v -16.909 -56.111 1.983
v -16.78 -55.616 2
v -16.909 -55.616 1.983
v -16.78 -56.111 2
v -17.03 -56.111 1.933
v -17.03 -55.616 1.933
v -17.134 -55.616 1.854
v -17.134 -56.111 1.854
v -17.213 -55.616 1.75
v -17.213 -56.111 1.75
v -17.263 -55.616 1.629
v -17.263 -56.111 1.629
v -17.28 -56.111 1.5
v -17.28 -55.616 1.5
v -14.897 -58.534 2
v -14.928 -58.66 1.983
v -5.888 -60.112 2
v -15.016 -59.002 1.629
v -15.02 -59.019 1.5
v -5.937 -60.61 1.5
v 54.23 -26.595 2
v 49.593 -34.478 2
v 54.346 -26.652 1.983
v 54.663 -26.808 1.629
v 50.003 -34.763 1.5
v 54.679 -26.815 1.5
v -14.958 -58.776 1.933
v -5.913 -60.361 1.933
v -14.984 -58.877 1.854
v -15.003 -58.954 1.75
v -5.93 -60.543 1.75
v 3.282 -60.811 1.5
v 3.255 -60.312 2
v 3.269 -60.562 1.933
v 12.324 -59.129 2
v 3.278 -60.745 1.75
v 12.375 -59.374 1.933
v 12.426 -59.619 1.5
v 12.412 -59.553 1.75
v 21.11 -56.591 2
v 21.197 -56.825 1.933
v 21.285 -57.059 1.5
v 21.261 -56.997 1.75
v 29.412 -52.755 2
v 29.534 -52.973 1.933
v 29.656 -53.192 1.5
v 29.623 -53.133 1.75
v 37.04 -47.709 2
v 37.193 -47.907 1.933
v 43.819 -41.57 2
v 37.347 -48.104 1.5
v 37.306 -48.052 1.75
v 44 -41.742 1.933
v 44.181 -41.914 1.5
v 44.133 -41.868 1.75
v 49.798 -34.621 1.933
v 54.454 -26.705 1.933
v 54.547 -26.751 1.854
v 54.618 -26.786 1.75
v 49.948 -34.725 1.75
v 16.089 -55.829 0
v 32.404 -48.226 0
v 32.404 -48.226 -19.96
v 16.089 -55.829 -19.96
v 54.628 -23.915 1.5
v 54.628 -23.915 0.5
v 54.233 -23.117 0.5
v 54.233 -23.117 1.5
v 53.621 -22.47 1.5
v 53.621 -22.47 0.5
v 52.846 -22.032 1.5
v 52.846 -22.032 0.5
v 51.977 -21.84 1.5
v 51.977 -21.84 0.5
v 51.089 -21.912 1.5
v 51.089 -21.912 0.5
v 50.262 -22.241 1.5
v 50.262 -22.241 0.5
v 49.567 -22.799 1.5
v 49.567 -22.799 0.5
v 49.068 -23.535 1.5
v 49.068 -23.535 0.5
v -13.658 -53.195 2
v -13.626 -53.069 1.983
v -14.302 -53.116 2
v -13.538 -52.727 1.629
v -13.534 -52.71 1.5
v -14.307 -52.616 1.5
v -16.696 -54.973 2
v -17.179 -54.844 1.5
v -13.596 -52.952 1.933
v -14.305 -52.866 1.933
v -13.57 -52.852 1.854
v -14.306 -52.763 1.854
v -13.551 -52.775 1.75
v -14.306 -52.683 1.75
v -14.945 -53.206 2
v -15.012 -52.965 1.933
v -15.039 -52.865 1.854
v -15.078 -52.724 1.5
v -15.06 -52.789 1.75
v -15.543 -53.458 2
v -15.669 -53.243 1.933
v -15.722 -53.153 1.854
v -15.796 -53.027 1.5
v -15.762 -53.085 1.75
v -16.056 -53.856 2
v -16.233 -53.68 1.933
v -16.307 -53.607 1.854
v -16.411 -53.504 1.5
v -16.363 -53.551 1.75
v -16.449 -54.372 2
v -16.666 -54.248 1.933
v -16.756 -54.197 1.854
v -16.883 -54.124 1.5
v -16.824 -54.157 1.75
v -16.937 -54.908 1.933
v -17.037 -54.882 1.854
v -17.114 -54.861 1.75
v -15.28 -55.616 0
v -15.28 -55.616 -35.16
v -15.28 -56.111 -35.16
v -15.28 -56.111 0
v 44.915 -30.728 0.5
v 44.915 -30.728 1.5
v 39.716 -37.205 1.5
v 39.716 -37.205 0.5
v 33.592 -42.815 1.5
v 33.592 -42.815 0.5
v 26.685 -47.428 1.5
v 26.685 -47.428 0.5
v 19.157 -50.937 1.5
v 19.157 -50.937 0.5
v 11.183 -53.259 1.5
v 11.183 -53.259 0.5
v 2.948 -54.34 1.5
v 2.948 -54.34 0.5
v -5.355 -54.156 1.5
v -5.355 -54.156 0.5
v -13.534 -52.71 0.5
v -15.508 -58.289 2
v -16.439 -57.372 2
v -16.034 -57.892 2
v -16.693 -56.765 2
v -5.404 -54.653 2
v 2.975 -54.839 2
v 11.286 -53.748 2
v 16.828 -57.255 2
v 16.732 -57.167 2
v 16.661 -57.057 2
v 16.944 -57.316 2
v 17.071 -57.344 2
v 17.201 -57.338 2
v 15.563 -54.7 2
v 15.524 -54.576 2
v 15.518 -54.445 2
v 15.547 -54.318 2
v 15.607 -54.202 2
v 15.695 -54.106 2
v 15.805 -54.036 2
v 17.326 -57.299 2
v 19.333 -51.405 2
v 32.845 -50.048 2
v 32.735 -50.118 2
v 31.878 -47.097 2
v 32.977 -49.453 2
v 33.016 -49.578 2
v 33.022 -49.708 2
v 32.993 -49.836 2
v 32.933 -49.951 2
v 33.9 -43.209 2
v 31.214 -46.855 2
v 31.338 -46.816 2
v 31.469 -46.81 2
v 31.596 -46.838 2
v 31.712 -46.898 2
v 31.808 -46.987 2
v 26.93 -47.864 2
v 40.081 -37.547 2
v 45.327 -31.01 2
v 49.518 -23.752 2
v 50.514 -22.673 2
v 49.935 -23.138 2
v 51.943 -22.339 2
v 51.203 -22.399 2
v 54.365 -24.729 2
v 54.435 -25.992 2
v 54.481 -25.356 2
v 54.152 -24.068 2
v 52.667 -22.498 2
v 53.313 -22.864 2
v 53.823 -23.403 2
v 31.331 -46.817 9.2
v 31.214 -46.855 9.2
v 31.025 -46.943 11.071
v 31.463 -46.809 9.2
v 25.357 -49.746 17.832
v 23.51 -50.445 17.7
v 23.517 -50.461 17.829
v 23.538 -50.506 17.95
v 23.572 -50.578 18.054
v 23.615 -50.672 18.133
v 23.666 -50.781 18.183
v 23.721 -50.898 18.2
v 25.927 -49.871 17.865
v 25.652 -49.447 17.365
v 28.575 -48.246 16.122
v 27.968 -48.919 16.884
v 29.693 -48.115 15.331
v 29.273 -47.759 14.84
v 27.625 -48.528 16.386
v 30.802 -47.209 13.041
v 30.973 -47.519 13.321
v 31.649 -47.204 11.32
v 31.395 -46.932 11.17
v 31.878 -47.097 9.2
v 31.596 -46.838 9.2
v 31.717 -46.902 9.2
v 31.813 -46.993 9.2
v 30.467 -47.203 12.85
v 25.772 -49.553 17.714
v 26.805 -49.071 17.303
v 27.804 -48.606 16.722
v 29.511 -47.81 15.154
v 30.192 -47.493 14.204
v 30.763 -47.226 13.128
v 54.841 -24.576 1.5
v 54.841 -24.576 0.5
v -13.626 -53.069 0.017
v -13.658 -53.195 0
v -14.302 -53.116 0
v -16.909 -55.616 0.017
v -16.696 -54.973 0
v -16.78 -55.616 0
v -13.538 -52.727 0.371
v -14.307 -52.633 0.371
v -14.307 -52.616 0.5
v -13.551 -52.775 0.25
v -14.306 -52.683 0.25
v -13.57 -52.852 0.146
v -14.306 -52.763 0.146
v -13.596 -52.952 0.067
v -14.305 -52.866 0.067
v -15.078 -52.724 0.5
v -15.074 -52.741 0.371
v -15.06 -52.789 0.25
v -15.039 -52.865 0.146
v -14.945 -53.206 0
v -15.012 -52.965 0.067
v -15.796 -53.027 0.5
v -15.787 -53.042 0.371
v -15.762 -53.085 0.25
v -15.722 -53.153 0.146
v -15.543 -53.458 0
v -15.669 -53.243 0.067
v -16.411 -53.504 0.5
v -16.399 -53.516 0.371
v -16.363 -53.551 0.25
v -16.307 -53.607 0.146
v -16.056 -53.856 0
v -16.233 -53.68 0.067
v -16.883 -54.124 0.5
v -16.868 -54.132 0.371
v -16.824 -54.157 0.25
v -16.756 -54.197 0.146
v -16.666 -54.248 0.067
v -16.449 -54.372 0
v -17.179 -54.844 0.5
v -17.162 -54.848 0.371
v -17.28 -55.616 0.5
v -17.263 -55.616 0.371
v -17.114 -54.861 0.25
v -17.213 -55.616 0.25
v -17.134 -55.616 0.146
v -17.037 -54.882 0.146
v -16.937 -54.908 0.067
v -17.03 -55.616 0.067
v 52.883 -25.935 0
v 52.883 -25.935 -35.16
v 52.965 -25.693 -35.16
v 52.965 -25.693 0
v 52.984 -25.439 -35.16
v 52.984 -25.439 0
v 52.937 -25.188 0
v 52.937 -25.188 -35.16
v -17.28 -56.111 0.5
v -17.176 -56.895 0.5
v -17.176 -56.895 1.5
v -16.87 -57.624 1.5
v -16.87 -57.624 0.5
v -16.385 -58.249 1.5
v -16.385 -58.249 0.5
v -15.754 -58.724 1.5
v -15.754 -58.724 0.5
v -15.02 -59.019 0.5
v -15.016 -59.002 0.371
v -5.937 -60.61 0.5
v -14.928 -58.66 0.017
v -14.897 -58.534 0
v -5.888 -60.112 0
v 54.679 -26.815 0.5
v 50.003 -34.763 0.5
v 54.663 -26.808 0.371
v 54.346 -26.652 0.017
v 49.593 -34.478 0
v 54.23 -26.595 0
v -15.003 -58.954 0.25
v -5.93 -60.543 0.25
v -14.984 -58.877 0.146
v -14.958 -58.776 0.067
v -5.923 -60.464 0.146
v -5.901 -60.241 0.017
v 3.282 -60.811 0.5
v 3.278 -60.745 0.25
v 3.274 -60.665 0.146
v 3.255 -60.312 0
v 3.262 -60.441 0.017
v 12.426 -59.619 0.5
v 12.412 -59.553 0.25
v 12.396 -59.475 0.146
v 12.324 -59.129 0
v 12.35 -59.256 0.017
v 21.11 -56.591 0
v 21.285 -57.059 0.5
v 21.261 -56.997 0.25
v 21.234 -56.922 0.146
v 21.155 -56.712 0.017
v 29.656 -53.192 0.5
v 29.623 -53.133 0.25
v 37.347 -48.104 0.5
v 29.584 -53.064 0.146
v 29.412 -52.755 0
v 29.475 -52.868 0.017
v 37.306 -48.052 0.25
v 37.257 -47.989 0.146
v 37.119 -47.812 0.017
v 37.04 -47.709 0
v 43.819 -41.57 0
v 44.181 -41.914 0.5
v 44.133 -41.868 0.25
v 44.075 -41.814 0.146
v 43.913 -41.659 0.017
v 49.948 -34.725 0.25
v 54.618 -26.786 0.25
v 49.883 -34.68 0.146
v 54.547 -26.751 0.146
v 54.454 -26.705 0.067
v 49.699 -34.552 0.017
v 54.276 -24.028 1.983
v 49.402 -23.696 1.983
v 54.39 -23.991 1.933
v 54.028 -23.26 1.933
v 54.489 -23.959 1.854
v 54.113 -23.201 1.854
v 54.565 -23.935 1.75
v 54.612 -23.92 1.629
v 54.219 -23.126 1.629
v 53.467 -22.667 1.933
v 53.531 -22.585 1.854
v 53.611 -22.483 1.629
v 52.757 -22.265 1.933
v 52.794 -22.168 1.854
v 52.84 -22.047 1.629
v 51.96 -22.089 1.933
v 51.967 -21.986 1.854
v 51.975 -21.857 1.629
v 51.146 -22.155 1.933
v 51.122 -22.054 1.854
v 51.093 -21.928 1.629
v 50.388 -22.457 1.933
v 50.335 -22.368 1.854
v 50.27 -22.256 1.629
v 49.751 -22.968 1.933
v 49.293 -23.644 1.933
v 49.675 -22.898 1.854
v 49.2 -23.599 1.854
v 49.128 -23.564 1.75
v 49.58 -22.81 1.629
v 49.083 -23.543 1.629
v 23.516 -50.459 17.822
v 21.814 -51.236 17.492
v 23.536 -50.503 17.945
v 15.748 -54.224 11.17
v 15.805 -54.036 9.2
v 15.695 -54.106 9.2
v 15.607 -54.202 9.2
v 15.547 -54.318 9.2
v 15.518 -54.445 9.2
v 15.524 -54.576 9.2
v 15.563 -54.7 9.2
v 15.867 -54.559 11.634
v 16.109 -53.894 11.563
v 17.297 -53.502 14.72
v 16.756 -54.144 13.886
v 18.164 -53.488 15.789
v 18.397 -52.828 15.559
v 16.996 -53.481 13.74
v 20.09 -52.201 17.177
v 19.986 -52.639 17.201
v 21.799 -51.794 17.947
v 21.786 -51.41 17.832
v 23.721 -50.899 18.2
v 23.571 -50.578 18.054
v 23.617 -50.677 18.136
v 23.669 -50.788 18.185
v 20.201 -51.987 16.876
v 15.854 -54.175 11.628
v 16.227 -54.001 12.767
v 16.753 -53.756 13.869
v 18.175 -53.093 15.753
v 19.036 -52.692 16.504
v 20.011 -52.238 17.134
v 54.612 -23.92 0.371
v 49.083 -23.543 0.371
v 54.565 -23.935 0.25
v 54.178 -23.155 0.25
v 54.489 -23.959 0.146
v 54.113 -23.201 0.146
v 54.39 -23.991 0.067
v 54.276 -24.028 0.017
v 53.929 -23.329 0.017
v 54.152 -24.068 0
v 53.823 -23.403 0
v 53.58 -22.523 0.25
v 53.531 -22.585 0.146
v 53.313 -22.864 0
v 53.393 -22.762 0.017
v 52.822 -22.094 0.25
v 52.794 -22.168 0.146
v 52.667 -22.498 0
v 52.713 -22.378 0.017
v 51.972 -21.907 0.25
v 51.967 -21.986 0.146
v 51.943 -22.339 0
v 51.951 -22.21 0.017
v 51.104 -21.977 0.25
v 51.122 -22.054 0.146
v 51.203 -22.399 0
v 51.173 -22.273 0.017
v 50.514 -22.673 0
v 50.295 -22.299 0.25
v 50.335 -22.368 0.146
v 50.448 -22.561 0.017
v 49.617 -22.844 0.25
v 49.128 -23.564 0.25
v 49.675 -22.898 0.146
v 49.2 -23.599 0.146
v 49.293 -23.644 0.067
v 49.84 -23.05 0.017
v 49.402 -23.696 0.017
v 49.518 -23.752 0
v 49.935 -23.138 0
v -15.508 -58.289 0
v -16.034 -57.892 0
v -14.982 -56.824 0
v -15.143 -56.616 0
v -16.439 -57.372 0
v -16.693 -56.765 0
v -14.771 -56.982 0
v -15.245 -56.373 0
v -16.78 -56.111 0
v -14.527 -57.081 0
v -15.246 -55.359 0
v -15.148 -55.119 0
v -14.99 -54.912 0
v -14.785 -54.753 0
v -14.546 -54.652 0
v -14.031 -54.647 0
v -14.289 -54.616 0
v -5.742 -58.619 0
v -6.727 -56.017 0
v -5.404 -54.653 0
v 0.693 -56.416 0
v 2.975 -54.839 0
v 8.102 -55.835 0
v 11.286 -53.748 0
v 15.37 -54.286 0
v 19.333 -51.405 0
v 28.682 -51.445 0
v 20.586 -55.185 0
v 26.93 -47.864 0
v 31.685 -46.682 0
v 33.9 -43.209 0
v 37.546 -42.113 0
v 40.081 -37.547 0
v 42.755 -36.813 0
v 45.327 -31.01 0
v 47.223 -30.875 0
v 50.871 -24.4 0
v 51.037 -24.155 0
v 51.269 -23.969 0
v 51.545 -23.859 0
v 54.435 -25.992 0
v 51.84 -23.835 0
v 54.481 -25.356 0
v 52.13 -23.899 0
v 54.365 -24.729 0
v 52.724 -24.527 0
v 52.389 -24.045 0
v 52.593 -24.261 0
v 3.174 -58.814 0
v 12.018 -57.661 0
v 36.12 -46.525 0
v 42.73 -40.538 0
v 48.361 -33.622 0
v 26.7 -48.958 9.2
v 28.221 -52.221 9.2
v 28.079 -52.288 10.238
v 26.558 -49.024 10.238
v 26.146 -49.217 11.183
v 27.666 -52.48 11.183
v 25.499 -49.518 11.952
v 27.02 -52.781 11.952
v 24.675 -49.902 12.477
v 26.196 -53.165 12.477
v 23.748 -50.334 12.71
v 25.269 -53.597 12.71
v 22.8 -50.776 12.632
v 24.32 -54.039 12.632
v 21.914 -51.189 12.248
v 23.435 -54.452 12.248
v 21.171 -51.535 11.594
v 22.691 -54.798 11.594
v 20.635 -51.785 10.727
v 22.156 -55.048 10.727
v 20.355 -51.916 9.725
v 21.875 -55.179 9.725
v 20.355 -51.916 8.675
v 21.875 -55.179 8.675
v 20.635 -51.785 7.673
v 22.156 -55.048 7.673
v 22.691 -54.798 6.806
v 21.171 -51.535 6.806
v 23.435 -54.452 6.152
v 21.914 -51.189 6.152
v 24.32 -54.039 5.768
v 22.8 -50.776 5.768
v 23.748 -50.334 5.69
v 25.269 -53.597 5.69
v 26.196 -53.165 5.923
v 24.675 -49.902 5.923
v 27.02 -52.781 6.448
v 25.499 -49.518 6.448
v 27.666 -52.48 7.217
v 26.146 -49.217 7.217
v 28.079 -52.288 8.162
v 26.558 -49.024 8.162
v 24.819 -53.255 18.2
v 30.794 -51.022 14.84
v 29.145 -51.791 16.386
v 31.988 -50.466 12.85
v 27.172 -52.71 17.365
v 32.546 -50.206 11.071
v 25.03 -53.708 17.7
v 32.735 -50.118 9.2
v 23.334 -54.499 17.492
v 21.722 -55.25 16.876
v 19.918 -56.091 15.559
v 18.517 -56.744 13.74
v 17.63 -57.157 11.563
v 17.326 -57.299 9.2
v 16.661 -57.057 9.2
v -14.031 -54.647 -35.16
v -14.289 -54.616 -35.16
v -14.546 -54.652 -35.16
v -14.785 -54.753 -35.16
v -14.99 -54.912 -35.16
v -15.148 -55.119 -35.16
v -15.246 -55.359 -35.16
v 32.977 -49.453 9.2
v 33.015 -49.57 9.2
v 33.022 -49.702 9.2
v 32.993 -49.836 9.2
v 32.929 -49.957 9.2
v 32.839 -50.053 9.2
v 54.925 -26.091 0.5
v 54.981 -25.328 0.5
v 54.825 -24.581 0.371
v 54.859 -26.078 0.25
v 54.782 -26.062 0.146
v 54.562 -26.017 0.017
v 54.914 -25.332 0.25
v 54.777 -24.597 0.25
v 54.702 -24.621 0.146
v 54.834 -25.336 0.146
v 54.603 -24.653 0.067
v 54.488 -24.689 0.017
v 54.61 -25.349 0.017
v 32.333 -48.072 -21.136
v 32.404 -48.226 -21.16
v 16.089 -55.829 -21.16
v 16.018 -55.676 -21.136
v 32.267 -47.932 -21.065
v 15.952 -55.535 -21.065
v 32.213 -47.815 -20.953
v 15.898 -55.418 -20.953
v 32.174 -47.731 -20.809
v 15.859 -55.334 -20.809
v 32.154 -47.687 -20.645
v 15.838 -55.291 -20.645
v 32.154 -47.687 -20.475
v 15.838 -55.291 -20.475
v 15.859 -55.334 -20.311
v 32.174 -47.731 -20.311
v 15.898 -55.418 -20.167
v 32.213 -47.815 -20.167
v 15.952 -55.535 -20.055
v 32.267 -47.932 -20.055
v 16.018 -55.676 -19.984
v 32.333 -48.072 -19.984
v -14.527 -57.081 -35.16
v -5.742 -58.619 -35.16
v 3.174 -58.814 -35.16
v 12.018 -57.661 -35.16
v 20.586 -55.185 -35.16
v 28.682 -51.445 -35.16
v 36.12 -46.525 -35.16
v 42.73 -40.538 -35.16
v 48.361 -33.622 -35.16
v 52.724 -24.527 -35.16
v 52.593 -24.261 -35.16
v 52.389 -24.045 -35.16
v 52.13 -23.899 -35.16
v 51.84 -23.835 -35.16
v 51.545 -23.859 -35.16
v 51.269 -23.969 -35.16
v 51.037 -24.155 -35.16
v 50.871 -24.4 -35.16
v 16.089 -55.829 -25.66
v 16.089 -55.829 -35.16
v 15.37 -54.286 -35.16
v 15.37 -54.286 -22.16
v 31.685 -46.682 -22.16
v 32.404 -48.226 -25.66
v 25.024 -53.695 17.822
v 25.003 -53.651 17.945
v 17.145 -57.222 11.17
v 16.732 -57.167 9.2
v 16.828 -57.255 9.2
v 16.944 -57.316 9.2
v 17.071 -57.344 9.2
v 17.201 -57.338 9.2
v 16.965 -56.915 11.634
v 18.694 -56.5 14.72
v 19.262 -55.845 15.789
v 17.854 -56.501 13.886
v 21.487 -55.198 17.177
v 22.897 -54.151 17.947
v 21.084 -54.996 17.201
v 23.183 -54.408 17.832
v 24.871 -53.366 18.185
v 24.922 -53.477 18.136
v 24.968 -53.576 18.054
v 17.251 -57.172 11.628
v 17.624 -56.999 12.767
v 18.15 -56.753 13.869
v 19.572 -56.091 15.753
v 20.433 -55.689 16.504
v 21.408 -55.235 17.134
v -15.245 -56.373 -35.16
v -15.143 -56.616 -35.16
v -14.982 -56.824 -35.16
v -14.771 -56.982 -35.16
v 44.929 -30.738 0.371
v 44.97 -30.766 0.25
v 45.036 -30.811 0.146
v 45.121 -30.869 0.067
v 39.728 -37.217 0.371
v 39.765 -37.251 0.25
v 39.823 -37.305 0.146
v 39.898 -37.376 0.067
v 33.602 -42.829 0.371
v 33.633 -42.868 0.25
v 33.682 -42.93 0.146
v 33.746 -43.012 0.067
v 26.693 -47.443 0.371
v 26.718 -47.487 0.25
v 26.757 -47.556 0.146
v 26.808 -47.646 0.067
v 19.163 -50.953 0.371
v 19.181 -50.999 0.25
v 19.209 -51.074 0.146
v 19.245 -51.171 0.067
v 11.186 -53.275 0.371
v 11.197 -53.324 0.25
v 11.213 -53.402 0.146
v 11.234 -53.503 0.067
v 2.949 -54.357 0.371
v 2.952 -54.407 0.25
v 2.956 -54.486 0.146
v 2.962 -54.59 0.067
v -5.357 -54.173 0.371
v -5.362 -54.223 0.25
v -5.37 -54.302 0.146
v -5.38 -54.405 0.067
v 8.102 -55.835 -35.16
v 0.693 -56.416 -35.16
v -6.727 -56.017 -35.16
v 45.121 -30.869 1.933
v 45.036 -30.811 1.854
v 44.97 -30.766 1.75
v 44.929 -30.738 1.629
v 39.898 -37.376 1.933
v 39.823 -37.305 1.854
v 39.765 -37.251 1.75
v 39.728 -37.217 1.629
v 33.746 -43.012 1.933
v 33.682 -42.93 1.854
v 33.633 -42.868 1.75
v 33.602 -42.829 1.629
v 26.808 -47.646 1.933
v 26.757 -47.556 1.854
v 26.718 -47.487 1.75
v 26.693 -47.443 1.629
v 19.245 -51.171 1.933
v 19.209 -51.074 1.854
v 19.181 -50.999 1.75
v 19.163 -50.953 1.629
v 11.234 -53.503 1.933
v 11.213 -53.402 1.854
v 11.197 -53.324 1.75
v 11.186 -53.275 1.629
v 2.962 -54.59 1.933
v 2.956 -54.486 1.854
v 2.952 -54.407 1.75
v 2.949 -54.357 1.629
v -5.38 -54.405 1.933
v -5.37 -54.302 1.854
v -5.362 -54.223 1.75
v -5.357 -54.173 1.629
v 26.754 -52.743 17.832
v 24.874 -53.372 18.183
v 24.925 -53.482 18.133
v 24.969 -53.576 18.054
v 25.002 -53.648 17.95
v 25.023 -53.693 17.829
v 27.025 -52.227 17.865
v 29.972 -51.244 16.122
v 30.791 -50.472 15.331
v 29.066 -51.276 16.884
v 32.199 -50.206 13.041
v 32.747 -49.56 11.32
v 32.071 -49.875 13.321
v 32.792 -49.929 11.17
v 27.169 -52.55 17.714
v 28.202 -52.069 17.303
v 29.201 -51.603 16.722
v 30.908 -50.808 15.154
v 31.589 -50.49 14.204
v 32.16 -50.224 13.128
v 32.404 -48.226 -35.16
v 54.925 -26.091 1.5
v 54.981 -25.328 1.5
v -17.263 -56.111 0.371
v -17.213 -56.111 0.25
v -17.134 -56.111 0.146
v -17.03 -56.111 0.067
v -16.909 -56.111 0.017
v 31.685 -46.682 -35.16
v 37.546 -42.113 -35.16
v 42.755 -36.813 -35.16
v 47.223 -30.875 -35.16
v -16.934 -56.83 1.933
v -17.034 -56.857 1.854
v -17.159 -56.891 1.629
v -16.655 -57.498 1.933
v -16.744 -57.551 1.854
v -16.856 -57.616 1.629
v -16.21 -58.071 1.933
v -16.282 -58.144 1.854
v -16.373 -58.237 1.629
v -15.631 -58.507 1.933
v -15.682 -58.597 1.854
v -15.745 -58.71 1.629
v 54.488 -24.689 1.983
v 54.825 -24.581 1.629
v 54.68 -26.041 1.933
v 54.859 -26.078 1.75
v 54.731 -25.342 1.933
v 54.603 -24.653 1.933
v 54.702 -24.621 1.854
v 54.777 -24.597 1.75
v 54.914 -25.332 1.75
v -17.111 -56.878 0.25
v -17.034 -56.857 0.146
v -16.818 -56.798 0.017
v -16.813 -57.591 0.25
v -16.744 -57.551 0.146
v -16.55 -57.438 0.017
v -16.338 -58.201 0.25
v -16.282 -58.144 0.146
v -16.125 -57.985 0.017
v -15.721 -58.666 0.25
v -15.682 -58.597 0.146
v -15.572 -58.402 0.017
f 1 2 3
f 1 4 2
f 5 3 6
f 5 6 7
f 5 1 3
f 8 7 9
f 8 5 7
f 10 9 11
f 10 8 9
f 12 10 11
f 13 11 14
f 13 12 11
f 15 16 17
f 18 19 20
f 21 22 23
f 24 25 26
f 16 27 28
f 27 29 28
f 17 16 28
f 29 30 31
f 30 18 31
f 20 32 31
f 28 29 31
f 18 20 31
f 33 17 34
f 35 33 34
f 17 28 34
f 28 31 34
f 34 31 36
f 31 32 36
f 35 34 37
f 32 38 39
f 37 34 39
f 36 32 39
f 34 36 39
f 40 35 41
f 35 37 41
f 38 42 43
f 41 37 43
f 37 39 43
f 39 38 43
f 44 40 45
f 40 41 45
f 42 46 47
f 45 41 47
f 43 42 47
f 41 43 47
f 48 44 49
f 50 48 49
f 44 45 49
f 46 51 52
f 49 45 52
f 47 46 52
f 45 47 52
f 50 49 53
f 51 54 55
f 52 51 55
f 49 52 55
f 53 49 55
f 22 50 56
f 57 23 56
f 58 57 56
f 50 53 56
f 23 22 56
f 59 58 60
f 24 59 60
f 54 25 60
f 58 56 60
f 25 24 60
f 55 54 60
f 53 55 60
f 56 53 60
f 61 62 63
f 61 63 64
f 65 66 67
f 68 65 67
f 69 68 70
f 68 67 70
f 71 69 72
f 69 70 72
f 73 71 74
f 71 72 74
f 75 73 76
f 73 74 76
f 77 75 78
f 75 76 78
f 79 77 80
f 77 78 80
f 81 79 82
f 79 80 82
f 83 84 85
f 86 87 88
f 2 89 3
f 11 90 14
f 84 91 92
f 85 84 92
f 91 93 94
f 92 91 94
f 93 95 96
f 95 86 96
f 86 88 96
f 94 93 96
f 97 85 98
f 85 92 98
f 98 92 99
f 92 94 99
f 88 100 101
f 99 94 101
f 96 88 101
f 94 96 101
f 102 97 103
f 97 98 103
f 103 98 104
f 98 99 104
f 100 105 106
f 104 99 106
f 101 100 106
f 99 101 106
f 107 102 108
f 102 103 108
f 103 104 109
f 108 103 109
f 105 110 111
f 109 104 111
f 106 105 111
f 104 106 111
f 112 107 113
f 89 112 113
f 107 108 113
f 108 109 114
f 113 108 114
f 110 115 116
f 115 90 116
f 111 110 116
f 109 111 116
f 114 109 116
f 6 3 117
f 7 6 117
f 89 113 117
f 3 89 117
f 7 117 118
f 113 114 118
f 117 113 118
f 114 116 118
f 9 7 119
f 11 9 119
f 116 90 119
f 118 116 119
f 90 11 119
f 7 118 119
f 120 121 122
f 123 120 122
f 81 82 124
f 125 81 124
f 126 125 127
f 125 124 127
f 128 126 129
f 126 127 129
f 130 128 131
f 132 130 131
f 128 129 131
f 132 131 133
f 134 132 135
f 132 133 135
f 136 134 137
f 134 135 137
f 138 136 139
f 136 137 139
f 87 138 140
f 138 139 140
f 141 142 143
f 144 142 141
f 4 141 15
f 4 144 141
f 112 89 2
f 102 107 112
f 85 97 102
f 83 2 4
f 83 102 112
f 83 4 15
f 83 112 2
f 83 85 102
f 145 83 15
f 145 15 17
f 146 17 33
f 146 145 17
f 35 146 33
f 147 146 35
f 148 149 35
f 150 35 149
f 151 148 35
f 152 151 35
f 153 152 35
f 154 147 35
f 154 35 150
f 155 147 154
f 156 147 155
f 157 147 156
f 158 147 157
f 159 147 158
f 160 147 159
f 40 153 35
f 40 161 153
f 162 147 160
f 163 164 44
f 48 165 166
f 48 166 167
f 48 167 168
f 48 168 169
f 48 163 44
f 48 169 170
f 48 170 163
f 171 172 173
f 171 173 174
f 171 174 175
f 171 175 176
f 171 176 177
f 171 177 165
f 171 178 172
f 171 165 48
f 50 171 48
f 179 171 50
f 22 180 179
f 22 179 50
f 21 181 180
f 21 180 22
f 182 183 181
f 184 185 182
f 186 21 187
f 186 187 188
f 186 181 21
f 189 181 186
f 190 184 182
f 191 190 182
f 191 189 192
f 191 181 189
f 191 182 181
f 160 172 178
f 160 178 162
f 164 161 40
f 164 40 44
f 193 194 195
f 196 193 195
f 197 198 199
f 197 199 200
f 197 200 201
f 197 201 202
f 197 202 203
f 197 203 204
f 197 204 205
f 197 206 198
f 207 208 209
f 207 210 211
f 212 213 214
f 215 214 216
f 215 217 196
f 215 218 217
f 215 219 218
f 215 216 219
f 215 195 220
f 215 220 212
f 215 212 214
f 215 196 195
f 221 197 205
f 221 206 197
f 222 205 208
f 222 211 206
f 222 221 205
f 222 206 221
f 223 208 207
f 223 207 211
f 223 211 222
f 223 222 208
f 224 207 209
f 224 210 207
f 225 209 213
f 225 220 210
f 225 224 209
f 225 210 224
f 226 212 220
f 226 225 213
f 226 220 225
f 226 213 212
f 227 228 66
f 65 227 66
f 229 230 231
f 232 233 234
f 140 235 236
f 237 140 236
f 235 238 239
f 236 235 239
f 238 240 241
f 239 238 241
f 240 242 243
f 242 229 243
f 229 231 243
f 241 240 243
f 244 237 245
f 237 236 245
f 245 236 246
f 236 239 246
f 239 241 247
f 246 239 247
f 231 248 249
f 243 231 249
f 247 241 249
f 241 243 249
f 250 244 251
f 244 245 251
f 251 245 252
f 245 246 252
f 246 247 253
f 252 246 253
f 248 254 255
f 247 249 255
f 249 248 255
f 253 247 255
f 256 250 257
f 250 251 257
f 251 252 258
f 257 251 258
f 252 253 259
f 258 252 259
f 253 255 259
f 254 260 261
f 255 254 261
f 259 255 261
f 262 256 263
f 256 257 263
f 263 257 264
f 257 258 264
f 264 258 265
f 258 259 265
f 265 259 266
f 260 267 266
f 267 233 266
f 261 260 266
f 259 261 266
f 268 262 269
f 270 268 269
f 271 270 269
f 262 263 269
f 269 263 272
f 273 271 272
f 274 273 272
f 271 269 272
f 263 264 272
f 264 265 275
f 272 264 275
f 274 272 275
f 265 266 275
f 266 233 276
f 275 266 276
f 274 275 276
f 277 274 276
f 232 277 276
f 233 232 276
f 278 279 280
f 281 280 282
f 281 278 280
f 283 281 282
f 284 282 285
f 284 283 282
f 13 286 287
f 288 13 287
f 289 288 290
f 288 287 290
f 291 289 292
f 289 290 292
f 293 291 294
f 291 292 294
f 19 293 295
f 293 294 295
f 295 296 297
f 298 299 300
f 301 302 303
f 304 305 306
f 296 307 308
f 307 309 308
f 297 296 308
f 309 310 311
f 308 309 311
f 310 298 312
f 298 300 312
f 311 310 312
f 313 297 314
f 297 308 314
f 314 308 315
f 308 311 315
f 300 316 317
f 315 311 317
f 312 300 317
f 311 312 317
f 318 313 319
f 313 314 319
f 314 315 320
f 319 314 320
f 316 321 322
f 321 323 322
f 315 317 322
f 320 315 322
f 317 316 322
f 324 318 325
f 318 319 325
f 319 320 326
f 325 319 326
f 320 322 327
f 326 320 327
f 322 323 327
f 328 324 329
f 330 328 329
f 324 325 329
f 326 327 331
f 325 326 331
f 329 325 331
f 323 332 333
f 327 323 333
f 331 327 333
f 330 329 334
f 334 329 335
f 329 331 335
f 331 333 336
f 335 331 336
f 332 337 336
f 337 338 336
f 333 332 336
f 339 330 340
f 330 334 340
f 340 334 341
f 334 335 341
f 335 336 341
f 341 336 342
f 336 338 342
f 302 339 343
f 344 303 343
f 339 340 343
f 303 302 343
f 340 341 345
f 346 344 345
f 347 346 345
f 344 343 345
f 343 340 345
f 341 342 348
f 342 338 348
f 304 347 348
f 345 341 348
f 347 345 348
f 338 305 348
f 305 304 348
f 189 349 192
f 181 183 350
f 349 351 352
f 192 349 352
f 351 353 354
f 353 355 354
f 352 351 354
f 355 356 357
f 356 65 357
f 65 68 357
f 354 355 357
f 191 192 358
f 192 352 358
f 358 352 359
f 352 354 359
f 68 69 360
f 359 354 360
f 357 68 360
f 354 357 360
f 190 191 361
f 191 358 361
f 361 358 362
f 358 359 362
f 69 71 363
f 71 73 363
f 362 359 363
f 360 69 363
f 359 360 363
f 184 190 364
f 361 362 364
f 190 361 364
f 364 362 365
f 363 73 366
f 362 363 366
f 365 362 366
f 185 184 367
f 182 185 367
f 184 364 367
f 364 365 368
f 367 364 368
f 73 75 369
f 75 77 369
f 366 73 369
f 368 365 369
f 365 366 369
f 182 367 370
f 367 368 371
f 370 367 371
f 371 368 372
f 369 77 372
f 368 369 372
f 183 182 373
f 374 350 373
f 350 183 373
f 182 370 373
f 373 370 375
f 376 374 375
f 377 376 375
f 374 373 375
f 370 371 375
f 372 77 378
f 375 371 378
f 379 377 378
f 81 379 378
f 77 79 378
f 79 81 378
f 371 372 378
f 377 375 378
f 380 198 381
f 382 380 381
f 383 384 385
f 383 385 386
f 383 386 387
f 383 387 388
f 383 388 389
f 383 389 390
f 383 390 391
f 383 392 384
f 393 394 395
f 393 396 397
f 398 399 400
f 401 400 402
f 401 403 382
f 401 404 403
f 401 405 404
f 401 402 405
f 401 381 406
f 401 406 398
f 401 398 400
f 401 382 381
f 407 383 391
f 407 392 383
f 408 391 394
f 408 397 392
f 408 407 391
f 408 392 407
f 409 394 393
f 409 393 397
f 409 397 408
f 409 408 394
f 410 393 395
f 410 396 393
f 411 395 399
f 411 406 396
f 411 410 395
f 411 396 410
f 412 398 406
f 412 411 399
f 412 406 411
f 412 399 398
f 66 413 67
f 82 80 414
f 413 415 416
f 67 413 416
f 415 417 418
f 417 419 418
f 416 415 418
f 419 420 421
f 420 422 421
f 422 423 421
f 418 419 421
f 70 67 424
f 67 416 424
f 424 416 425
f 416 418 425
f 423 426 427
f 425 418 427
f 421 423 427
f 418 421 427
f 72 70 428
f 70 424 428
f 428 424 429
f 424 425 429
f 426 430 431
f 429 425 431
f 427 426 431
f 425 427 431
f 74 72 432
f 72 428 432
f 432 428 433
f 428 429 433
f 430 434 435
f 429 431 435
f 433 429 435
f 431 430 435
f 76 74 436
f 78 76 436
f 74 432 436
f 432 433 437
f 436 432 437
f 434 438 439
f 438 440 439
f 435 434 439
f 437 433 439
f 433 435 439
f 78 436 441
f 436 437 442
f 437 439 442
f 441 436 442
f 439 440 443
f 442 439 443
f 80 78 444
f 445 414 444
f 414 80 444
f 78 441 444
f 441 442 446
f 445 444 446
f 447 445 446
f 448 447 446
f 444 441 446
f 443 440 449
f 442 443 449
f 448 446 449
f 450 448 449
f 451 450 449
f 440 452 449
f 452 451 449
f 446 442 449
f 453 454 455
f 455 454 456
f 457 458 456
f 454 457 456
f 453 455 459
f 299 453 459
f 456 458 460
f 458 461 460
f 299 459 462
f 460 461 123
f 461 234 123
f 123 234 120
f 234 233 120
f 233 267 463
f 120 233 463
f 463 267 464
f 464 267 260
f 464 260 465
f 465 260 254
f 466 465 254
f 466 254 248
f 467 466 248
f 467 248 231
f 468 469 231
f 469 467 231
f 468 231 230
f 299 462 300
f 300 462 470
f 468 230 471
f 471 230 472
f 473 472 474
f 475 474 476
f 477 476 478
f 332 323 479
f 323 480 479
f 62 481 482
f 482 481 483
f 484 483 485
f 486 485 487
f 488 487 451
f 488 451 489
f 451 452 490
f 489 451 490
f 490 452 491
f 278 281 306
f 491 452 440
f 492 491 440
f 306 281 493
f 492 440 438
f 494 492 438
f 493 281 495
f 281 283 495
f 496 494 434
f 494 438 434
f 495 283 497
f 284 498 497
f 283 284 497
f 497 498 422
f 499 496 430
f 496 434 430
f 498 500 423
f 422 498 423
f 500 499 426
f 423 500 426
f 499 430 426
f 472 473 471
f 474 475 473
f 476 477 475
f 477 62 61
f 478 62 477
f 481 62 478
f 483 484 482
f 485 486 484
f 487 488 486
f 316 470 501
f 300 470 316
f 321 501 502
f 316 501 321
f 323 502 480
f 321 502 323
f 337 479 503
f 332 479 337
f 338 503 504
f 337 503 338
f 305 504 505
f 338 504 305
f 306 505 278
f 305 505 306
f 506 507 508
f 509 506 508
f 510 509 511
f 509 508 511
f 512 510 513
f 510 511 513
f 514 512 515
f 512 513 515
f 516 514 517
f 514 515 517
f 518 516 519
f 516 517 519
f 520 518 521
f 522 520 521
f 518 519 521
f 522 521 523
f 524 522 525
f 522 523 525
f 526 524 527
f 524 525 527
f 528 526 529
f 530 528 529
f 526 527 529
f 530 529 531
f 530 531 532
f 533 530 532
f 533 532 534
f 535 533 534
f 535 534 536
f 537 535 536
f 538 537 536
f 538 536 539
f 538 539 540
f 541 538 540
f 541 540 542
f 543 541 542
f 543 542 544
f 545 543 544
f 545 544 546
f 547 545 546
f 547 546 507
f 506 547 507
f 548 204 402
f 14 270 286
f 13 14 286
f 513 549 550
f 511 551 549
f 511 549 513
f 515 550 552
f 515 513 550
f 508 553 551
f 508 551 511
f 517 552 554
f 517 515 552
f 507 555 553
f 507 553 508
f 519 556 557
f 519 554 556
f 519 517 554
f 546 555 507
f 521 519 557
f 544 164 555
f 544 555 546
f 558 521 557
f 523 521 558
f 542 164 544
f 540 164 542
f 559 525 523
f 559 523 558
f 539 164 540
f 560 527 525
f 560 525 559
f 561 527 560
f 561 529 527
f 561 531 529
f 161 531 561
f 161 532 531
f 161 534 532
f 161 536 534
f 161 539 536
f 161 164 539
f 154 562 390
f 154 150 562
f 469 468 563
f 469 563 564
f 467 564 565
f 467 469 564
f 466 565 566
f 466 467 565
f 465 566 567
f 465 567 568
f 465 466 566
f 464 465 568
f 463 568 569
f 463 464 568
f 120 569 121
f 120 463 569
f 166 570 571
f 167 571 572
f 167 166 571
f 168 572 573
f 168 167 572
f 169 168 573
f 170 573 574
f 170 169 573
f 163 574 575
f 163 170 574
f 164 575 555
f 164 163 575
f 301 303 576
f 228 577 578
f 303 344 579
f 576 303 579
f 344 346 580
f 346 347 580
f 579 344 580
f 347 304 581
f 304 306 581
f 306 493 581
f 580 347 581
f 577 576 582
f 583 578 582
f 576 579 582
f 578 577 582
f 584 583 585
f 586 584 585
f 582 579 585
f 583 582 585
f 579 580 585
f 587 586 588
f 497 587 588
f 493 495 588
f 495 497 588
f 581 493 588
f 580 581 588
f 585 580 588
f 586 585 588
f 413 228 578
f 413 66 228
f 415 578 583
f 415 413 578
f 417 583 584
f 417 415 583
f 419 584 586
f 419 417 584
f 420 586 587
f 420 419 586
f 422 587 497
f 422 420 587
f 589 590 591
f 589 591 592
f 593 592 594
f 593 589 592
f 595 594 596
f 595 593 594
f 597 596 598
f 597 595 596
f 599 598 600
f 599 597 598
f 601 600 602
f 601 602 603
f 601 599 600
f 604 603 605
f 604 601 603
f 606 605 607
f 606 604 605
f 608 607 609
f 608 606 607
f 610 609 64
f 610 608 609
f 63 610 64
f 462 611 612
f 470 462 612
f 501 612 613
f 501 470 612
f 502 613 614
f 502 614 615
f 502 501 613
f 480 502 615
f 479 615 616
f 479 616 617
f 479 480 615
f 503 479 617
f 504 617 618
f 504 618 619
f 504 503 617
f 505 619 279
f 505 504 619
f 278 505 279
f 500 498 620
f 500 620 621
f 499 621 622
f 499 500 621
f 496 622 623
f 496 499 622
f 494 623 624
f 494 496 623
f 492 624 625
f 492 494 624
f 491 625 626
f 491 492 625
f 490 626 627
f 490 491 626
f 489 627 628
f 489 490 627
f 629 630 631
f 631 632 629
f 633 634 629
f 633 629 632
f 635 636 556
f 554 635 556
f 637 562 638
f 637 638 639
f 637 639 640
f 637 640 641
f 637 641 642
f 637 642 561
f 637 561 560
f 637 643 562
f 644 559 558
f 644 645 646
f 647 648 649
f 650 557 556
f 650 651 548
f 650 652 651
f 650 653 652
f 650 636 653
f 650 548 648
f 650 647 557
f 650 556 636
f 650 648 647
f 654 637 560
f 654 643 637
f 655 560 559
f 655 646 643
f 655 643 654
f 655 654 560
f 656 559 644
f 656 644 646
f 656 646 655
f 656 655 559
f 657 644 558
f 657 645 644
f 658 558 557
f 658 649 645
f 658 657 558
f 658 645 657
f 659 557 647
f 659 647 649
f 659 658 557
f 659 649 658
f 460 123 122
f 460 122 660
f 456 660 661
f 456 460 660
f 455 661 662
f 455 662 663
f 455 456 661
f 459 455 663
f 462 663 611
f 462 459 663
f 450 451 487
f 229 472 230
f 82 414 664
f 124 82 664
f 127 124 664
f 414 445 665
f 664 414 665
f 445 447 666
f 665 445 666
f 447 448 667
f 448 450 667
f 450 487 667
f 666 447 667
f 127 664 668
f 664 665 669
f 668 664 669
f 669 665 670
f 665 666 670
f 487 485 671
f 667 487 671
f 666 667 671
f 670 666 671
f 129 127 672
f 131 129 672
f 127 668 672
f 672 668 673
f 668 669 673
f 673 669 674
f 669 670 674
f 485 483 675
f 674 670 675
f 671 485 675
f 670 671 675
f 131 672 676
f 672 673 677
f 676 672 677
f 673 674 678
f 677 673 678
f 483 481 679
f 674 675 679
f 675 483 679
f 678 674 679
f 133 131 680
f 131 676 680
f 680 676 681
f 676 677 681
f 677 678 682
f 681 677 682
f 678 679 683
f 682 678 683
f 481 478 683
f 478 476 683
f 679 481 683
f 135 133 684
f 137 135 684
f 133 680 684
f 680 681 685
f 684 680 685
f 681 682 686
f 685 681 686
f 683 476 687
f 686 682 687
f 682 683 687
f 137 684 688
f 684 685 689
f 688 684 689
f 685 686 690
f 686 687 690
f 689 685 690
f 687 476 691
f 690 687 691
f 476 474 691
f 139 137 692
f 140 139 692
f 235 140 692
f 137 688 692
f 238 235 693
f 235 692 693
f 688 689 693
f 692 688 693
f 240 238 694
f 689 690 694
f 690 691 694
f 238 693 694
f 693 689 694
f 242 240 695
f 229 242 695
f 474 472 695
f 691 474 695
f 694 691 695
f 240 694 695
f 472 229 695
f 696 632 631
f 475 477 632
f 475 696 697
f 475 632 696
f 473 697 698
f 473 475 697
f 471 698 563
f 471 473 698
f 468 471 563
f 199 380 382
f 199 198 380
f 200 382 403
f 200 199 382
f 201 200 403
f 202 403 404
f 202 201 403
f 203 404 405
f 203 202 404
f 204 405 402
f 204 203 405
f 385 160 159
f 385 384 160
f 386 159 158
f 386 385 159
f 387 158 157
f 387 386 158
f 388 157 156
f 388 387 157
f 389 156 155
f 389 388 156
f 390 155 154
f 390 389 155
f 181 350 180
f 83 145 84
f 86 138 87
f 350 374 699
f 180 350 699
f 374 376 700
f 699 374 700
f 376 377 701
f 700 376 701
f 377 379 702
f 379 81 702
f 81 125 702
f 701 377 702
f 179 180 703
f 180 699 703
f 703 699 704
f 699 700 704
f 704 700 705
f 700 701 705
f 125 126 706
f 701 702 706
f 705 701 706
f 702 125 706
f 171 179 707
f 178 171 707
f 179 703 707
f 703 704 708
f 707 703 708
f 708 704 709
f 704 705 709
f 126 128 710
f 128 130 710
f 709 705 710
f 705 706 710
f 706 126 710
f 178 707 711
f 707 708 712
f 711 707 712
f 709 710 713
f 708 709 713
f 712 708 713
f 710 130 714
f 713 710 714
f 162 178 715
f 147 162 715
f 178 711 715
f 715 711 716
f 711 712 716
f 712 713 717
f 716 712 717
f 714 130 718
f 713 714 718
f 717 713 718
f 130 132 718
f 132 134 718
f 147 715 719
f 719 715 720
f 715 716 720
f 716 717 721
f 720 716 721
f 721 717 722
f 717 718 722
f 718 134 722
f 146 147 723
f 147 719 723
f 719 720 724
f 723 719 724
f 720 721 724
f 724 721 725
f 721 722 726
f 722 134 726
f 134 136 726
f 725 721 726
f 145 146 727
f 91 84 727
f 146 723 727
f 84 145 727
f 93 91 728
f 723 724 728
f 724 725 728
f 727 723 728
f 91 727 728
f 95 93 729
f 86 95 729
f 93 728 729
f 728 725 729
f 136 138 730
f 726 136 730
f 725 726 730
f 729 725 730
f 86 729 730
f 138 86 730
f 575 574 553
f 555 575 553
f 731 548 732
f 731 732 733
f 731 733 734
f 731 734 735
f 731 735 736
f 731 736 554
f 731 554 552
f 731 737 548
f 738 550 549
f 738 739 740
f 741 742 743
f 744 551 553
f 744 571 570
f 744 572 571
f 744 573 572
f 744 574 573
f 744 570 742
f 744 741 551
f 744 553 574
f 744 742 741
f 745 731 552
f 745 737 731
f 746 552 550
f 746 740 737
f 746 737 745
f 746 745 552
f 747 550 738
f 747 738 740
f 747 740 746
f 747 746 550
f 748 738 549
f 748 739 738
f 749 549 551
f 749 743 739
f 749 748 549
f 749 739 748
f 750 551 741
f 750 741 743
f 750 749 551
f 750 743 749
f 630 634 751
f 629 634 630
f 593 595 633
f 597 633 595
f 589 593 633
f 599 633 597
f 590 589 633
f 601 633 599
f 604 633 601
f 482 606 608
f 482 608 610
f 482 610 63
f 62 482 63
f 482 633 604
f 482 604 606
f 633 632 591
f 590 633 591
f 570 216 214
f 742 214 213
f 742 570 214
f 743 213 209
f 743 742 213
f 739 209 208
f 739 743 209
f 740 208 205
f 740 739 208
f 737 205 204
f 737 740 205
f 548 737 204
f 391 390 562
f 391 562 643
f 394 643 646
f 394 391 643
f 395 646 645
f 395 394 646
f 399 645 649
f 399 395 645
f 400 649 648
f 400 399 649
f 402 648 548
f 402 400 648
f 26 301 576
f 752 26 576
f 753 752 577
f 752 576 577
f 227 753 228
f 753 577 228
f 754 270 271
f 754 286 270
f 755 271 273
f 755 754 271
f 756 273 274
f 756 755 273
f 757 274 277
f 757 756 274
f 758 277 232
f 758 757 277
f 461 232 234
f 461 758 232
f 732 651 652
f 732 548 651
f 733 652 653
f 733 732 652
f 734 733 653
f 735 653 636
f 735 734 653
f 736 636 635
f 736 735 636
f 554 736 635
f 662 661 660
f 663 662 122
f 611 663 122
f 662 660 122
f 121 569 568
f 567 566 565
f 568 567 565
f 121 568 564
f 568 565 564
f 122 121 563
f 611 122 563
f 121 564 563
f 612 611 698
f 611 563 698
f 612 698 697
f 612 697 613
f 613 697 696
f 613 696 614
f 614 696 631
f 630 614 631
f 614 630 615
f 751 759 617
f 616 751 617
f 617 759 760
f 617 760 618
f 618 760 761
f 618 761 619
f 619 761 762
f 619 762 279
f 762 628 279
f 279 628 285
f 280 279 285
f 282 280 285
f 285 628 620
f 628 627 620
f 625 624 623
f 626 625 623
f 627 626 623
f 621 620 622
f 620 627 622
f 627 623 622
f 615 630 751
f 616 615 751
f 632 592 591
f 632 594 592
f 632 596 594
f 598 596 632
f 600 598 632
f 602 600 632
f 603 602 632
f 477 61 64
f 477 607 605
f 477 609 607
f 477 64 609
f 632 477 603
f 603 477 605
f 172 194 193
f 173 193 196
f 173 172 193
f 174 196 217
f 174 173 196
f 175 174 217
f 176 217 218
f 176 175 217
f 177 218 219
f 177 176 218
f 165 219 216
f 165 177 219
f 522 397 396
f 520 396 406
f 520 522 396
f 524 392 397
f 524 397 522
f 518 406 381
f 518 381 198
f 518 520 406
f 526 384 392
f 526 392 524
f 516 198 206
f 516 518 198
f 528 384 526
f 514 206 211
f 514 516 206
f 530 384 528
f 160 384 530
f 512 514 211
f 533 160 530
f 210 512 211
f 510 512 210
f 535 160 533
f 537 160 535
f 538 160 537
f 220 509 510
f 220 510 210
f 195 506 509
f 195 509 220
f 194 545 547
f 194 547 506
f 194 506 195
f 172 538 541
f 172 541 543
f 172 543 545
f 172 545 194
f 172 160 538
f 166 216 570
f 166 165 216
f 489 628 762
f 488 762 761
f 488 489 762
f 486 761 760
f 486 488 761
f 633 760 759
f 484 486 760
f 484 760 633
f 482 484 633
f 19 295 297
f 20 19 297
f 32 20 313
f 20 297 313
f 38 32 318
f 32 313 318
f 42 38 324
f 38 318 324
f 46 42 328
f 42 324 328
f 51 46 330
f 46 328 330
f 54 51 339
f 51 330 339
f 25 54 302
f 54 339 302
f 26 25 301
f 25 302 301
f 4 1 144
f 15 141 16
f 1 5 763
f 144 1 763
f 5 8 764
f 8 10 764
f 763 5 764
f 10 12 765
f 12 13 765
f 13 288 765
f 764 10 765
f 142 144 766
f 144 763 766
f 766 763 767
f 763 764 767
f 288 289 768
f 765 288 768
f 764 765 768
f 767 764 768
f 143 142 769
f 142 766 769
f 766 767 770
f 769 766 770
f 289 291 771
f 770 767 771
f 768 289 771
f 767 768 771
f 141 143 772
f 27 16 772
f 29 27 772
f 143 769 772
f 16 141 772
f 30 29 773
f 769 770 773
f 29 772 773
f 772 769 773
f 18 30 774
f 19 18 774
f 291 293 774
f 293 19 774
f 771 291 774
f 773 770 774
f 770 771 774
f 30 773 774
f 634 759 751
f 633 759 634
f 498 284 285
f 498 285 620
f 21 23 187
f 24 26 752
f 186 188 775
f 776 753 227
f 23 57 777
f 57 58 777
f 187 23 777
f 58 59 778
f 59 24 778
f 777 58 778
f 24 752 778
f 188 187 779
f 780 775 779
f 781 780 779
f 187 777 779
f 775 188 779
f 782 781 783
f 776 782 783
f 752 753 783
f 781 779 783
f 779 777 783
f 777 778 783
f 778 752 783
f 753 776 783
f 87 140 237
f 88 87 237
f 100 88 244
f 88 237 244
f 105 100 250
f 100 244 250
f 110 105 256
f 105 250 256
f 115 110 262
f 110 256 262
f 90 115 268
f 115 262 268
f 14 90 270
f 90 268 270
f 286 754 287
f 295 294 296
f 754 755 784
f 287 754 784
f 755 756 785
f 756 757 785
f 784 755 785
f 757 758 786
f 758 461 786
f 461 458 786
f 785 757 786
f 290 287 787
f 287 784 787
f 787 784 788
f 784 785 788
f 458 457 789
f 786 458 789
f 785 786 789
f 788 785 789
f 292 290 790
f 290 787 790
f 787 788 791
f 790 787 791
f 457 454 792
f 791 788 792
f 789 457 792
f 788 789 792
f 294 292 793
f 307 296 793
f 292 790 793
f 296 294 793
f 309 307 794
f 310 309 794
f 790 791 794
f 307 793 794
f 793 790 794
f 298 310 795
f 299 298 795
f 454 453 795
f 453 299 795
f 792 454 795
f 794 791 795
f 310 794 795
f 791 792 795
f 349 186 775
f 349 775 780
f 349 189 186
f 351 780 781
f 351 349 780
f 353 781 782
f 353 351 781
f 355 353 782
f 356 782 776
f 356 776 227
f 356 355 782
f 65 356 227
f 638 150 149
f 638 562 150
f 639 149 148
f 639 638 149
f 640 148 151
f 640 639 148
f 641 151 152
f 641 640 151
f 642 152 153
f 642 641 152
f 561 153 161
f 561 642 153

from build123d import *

# Parameters (mm, degrees)
BASE_EXTRUDE_DEPTH  = 2
BOSS_EXTRUDE1_DEPTH = 37.16
BOSS_EXTRUDE2_DEPTH = 16.2
FILLET1_R           = 9
SKETCH4_R           = 3.52
CUT_EXTRUDE1_DEPTH  = 64.580171374
FILLET3_R           = 0.5
CUT_EXTRUDE3_START  = -35.16
CUT_EXTRUDE3_DEPTH  = 35.16
BOSS_EXTRUDE3_REACH = 89.266


# Read off the part's stored shape, not the designer's step: Cut-Extrude3
with BuildPart() as part:
    # Sketch1 → Base-Extrude (new body)
    with BuildSketch(Plane.XY):
        with BuildLine():
            Line((54.84113201, -24.576058398), (54.628473973, -23.914611391))
            ThreePointArc((54.628473973, -23.914611391), (51.976550593, -21.839785691), (49.067516522, -23.535403595))
            ThreePointArc((49.067516522, -23.535403595), (22.988082213, -49.326306127), (-13.533918495, -52.710240468))
            ThreePointArc((-13.533918495, -52.710240468), (-16.11871633, -53.245518126), (-17.28, -55.61598691))
            Line((-17.28, -55.61598691), (-17.28, -56.111421297))
            ThreePointArc((-17.28, -56.111421297), (-16.648511043, -57.952658773), (-15.019896373, -59.018748826))
            ThreePointArc((-15.019896373, -59.018748826), (25.543504513, -55.284169318), (54.678638299, -26.815229139))
            ThreePointArc((54.678638299, -26.815229139), (54.977241057, -25.711417004), (54.84113201, -24.576058398))
        make_face()
    extrude(amount=BASE_EXTRUDE_DEPTH)

    # Sketch2 → Boss-Extrude1 (add)
    with BuildSketch(Plane.XY.offset(2)):
        with BuildLine():
            Line((-15.28, -55.61598691), (-15.28, -56.111421297))
            ThreePointArc((-15.28, -56.111421297), (-15.069503681, -56.725167122), (-14.526632124, -57.080530473))
            ThreePointArc((-14.526632124, -57.080530473), (24.70463737, -53.468597255), (52.882952312, -25.934597641))
            ThreePointArc((52.882952312, -25.934597641), (52.982486565, -25.566660262), (52.937116882, -25.188207393))
            Line((52.937116882, -25.188207393), (52.724458845, -24.526760386))
            ThreePointArc((52.724458845, -24.526760386), (51.840484385, -23.83515182), (50.870806361, -24.400357788))
            ThreePointArc((50.870806361, -24.400357788), (23.832921691, -51.139106794), (-14.031306165, -54.647404763))
            ThreePointArc((-14.031306165, -54.647404763), (-14.892905443, -54.825830649), (-15.28, -55.61598691))
        make_face()
    extrude(amount=-BOSS_EXTRUDE1_DEPTH)

    # Sketch3 → Boss-Extrude2 (add)
    with BuildSketch(Plane.XY.offset(2)):
        Polygon((31.667200425, -46.643561321), (33.187911486, -49.906602521), (16.872705491, -57.510157828), (15.351994429, -54.247116629), align=None)
    extrude(amount=BOSS_EXTRUDE2_DEPTH)

    # Fillet1
    fillet1_edges = [part.edges().sort_by_distance(p)[0] for p in [
        (16.11234996, -55.878637228, 18.2),
        (32.427555956, -48.275081921, 18.2),
    ]]
    fillet(fillet1_edges, radius=FILLET1_R - 0.0001)  # a hair under: the kernel refuses the full size

    # Sketch4 → Cut-Extrude1 (cut, through all)
    with BuildSketch(Plane(origin=(25.030308488, -53.708380174, 0), x_dir=(0.9064003331019249, 0.4224197393028875, 0), z_dir=(0.42241973930288756, -0.906400333101925, 0))):
        with Locations((0, 9.2)):
            Circle(SKETCH4_R)
    extrude(amount=-CUT_EXTRUDE1_DEPTH, mode=Mode.SUBTRACT)

    # Fillet3
    fillet3_edges = [part.edges().sort_by_distance(p)[0] for p in [
        (54.977241057, -25.711417004, 2),
        (25.543504513, -55.284169318, 0),
        (-16.648511043, -57.952658773, 0),
        (54.734802991, -24.245334894, 2),
        (51.976550593, -21.839785691, 2),
        (22.988082213, -49.326306127, 2),
        (-16.11871633, -53.245518126, 2),
        (-17.28, -55.863704104, 2),
        (-16.648511043, -57.952658773, 2),
        (25.543504513, -55.284169318, 2),
        (16.872705491, -57.510157828, 5.60005),
        (15.351994429, -54.247116629, 5.60005),
        (31.667200425, -46.643561321, 5.60005),
        (29.277920373, -47.757063843, 15.56399032),
        (17.741274481, -53.133614107, 15.56399032),
        (33.187911486, -49.906602521, 5.60005),
        (30.798631434, -51.020105042, 15.56399032),
        (-17.28, -55.863704104, 0),
        (19.261985543, -56.396655306, 15.56399032),
        (-16.11871633, -53.245518126, 0),
        (22.988082213, -49.326306127, 0),
        (51.976550593, -21.839785691, 0),
        (54.734802991, -24.245334894, 0),
        (54.977241057, -25.711417004, 0),
    ]]
    fillet(fillet3_edges, radius=FILLET3_R)

    # Cut-Extrude3 outline → Cut-Extrude3 (cut)
    with BuildSketch(Plane(origin=(0, 0, -35.16), x_dir=(-1, 0, 0), z_dir=(0, 0, -1)).offset(CUT_EXTRUDE3_START)):
        with BuildLine():
            Line((-31.685344985, -46.682494719), (-32.404496034, -48.225601466))
            Line((-32.404496034, -48.225601466), (-16.089290038, -55.829156774))
            Line((-16.089290038, -55.829156774), (-15.370138989, -54.286050026))
            ThreePointArc((-15.370138989, -54.286050026), (-23.832921691, -51.139106794), (-31.685344985, -46.682494719))
        make_face()
    extrude(amount=CUT_EXTRUDE3_DEPTH, mode=Mode.SUBTRACT)

    # Sketch7 → Boss-Extrude3 (add, up to next)
    with BuildSketch(Plane(origin=(8.157602998, 3.801777654, 0), x_dir=(0, 0, 1), z_dir=(-0.9064003331019256, -0.42241973930288634, 0)), mode=Mode.PRIVATE) as boss_extrude3_sk1:
        with BuildLine():
            Line((-25.66, -57.4), (-22.16, -55.697543931))
            Line((-22.16, -55.697543931), (-21.16, -57.4))
            ThreePointArc((-21.16, -57.4), (-20.56, -56.8), (-19.96, -57.4))
            Line((-19.96, -57.4), (-21.16, -57.566686604))
            Line((-21.16, -57.566686604), (-25.66, -57.4))
        make_face()
    boss_extrude3_tool1 = extrude(boss_extrude3_sk1.sketch, amount=BOSS_EXTRUDE3_REACH, mode=Mode.PRIVATE) - part.part
    add(boss_extrude3_tool1.solids().sort_by_distance((32.205788, -47.799227, -22.639326))[0])
    add(boss_extrude3_tool1.solids().sort_by_distance((32.205788, -47.799227, -22.639326))[1])


solid = part.part
